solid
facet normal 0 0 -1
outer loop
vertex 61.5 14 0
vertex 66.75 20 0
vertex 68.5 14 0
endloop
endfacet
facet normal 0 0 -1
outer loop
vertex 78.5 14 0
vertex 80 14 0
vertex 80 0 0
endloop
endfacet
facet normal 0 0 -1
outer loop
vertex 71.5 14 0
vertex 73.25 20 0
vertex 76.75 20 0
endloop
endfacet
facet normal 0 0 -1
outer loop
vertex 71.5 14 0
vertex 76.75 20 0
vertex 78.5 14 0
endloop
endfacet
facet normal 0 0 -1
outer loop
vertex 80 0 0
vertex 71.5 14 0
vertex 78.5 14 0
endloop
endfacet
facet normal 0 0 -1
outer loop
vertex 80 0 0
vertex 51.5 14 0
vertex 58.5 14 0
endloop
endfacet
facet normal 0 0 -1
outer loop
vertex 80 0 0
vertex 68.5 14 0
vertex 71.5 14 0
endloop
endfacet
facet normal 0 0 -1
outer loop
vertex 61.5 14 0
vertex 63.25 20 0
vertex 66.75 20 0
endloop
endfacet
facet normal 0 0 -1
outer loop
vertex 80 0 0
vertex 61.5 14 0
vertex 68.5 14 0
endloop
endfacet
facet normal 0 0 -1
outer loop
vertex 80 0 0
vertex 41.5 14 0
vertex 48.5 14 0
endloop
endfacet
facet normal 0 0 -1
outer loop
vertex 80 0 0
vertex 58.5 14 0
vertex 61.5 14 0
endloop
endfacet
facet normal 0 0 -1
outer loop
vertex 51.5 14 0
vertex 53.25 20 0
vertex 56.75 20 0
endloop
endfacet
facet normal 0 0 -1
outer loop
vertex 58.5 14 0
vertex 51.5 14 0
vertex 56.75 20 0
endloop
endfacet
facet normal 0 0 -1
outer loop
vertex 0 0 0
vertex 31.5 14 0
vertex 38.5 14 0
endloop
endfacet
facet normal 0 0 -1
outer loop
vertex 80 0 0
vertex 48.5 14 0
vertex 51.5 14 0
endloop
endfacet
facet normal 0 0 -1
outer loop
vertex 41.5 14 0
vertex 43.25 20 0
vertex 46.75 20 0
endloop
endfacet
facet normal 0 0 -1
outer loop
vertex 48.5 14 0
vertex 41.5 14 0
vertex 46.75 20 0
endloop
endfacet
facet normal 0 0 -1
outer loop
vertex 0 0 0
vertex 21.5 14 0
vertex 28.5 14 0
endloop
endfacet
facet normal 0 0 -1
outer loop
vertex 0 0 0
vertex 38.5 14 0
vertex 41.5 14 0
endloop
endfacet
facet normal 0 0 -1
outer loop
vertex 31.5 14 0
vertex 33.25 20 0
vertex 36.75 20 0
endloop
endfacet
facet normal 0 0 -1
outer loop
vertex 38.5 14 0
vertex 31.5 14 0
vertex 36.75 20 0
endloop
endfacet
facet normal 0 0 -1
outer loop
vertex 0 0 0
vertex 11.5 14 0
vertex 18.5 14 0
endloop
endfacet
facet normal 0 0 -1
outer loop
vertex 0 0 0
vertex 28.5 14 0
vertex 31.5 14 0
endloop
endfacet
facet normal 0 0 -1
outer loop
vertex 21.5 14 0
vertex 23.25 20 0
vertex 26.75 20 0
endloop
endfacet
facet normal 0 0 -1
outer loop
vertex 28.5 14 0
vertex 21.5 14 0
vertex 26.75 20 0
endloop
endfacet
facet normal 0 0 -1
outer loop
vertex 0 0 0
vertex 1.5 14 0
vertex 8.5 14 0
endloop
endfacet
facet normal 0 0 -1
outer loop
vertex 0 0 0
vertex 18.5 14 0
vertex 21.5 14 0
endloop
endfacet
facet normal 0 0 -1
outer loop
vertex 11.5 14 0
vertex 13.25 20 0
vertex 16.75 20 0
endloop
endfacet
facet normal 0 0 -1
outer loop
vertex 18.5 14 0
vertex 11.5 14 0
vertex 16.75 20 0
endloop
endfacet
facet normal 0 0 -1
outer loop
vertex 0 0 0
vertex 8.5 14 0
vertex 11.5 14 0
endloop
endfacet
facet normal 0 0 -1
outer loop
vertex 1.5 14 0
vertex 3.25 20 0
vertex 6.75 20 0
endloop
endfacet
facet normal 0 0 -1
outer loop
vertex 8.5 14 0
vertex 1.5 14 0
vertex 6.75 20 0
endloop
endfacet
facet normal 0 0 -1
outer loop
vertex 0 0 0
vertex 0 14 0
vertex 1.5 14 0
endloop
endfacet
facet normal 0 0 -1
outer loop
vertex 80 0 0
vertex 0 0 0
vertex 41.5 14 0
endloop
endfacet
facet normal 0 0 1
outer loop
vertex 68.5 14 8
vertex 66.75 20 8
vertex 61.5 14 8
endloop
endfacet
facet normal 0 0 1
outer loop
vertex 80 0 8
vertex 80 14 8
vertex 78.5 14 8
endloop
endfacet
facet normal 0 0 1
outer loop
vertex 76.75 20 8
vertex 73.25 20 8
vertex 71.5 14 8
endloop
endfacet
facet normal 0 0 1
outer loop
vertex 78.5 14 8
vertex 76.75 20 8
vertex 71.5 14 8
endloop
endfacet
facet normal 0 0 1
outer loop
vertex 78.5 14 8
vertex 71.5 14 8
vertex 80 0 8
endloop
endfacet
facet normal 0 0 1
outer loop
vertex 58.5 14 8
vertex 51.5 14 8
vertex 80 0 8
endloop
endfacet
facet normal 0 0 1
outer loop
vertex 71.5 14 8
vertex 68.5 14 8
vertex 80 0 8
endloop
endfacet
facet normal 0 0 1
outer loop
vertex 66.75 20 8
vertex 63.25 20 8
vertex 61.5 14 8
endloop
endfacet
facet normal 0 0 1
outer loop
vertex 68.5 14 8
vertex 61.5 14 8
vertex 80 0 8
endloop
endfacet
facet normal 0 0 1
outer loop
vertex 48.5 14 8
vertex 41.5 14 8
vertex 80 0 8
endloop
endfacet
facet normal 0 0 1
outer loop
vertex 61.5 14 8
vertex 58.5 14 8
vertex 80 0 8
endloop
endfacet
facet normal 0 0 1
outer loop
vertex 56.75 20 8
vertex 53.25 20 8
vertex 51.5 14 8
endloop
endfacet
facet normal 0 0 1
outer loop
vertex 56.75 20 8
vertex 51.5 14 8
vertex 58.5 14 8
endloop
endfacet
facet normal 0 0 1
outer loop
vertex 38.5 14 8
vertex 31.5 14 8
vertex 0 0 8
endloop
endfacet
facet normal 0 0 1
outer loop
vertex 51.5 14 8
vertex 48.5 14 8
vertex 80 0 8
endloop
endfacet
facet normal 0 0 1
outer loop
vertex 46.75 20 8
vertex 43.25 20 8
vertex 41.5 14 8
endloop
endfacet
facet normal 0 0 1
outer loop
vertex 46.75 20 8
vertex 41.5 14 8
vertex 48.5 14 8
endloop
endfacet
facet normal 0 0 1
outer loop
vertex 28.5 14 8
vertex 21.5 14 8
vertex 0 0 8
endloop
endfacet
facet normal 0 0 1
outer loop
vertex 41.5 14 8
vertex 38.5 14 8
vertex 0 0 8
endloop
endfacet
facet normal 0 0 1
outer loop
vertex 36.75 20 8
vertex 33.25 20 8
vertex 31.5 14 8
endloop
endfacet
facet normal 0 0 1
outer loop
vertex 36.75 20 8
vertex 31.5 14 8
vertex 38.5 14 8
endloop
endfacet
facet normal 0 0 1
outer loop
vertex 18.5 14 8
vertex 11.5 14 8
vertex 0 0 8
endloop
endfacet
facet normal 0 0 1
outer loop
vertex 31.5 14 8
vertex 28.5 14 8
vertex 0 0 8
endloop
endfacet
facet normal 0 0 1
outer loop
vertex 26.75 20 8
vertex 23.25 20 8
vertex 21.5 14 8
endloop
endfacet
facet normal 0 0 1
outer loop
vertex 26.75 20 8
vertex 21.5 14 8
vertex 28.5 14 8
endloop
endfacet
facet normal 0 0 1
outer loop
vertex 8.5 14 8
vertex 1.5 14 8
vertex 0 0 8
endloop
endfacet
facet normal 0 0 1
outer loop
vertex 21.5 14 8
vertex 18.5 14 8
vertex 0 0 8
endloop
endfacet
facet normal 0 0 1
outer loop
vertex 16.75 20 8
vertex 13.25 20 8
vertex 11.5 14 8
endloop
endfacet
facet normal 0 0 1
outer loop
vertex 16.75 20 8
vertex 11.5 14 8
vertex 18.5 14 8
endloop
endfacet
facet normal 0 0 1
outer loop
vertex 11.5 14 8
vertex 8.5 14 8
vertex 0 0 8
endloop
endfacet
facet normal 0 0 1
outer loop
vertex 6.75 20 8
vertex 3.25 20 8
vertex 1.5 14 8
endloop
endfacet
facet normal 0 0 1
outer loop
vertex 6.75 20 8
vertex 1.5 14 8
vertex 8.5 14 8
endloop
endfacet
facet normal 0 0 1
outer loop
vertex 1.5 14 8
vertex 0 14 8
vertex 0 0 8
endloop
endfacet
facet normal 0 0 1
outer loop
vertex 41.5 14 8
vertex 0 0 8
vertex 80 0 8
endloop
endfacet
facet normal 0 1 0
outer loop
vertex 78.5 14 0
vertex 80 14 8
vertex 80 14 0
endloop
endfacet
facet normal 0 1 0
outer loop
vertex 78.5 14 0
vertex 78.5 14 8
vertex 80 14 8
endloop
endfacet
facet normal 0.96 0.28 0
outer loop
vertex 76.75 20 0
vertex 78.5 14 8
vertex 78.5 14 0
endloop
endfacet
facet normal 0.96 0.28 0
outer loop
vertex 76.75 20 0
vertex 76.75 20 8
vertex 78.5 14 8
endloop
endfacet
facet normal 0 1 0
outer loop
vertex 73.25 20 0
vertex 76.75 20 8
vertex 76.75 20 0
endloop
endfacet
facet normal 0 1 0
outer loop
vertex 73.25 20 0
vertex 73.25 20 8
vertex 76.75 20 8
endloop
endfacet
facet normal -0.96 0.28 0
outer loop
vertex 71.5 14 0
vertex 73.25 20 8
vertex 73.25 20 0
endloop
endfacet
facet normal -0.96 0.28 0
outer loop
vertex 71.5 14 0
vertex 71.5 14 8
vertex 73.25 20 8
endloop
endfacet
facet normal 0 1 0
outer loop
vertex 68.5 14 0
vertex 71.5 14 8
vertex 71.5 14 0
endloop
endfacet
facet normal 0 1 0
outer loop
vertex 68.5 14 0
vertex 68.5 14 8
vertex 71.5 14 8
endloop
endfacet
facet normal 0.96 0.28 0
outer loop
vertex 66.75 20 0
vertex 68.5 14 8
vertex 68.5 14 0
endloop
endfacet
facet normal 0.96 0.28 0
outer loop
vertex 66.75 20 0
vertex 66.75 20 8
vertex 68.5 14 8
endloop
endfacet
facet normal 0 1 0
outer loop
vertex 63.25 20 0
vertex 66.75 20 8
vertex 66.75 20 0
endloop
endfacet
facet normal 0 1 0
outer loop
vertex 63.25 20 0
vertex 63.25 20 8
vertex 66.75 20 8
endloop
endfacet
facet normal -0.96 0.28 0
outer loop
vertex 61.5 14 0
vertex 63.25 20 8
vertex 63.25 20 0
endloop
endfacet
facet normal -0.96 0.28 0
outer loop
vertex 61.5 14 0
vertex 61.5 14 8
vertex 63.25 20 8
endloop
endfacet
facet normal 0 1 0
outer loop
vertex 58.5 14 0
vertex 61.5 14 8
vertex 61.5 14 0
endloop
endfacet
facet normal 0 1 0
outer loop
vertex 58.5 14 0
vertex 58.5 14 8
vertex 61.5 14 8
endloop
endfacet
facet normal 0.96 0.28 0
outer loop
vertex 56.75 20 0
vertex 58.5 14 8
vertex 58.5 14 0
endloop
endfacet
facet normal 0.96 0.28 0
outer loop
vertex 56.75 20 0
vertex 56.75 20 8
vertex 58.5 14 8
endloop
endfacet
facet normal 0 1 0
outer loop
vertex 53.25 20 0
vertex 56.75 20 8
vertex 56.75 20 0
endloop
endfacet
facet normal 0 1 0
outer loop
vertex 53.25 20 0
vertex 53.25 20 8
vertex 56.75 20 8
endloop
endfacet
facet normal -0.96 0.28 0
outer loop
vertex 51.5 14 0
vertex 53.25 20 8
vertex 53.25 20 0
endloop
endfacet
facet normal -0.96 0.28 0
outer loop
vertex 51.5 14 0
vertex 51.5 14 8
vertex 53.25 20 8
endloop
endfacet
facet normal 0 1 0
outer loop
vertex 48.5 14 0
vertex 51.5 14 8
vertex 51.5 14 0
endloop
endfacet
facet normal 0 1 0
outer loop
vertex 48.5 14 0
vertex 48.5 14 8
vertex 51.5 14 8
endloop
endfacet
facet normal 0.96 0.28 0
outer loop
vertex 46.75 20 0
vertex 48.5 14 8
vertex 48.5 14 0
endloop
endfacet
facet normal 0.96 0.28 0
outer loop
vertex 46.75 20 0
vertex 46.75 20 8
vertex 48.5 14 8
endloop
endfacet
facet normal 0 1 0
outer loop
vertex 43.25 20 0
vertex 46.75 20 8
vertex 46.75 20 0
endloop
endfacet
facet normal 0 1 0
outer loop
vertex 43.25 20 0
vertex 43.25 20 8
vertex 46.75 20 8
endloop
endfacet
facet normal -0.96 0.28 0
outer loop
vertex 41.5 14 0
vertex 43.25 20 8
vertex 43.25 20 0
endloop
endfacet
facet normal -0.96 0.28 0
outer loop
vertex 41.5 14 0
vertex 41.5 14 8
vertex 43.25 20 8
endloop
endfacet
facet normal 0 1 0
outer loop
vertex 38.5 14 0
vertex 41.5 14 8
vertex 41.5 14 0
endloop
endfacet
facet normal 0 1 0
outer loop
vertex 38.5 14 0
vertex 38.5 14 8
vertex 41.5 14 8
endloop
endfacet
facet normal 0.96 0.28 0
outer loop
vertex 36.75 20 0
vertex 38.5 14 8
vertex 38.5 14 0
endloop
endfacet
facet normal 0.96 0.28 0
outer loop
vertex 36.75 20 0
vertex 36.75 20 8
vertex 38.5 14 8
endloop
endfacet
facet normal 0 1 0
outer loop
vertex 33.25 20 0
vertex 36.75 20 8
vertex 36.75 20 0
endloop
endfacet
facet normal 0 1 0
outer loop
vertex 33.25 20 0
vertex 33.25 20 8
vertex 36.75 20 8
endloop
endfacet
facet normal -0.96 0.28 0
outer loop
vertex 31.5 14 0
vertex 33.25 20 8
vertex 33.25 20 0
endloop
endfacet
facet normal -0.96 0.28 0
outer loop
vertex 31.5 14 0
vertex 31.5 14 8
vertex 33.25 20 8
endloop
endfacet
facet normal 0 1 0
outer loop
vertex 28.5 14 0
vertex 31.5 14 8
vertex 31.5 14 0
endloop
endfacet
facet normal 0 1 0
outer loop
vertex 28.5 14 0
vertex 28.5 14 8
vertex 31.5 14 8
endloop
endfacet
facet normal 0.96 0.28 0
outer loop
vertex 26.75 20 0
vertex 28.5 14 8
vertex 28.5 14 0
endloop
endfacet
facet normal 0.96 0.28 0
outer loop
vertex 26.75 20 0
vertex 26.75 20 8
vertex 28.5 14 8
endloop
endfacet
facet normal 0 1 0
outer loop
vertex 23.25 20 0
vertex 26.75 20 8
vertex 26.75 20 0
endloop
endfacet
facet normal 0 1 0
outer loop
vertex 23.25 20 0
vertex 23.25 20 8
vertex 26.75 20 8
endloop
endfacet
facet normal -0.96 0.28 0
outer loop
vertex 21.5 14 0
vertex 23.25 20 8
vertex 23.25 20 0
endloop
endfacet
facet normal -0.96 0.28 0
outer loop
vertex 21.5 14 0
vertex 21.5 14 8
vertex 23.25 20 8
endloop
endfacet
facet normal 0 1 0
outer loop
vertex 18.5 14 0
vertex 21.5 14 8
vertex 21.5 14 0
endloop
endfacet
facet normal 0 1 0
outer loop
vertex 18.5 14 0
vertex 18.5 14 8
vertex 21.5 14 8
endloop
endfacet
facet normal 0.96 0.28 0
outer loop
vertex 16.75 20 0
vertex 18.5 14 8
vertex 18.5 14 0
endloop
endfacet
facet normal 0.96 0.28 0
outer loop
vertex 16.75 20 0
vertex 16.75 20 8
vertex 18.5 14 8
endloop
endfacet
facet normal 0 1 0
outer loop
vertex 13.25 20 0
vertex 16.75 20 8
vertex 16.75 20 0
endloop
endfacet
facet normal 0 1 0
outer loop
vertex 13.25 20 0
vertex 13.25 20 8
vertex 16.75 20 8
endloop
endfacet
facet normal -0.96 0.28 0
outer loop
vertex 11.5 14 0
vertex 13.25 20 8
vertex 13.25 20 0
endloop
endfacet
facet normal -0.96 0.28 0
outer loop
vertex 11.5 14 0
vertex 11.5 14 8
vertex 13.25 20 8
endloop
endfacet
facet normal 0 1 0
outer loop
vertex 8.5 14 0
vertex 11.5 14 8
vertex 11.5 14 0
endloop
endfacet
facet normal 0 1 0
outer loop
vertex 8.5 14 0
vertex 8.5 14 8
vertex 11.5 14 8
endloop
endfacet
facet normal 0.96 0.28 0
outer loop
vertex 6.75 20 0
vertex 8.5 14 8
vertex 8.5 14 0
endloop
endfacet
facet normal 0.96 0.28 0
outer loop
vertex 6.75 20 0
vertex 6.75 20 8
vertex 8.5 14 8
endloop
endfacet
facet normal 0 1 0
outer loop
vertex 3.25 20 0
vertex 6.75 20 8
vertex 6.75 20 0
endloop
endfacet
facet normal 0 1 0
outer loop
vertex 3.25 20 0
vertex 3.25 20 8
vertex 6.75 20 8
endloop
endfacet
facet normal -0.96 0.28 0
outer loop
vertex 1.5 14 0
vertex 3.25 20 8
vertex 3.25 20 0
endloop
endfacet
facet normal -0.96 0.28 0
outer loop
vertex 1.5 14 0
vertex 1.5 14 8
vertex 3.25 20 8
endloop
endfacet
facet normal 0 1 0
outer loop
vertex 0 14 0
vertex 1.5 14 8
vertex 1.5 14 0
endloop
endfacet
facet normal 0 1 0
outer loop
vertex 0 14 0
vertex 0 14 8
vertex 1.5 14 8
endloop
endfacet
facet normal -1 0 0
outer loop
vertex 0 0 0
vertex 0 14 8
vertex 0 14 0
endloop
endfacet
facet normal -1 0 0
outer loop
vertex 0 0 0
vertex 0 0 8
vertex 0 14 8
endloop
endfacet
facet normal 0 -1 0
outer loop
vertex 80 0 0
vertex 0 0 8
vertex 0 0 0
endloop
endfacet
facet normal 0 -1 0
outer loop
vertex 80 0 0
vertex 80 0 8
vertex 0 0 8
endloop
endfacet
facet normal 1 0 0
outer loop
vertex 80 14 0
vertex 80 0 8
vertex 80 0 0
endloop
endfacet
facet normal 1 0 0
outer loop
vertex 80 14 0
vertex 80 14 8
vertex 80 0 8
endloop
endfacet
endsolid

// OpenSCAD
$fn = 32;

// ----------------------------------------------------------------------
// Gear rack: 8 teeth, pitch 10 mm
// ----------------------------------------------------------------------

// --- parameters (mm) ---
teeth = 8;                // number of teeth
pitch = 10;               // tooth pitch, X
root_w = 7;               // tooth width at the root
tip_w = 3.5;              // tooth width at the tip
base_h = 14;              // rack body height, Y
tooth_h = 6;              // tooth height above the body
plate_t = 8;              // rack width, Z (extrusion height)

rack_l = teeth * pitch;  // overall length
total_h = base_h + tooth_h;  // overall height

profile = [[0, 0], [80, 0], [80, 14], [78.5, 14], [76.75, 20], [73.25, 20], [71.5, 14], [68.5, 14], [66.75, 20], [63.25, 20], [61.5, 14], [58.5, 14], [56.75, 20], [53.25, 20], [51.5, 14], [48.5, 14], [46.75, 20], [43.25, 20], [41.5, 14], [38.5, 14], [36.75, 20], [33.25, 20], [31.5, 14], [28.5, 14], [26.75, 20], [23.25, 20], [21.5, 14], [18.5, 14], [16.75, 20], [13.25, 20], [11.5, 14], [8.5, 14], [6.75, 20], [3.25, 20], [1.5, 14], [0, 14]];  // primary outline, 36 points, counter clockwise

// --- the one profile operation ---
linear_extrude(height = plate_t) polygon(points = profile);
